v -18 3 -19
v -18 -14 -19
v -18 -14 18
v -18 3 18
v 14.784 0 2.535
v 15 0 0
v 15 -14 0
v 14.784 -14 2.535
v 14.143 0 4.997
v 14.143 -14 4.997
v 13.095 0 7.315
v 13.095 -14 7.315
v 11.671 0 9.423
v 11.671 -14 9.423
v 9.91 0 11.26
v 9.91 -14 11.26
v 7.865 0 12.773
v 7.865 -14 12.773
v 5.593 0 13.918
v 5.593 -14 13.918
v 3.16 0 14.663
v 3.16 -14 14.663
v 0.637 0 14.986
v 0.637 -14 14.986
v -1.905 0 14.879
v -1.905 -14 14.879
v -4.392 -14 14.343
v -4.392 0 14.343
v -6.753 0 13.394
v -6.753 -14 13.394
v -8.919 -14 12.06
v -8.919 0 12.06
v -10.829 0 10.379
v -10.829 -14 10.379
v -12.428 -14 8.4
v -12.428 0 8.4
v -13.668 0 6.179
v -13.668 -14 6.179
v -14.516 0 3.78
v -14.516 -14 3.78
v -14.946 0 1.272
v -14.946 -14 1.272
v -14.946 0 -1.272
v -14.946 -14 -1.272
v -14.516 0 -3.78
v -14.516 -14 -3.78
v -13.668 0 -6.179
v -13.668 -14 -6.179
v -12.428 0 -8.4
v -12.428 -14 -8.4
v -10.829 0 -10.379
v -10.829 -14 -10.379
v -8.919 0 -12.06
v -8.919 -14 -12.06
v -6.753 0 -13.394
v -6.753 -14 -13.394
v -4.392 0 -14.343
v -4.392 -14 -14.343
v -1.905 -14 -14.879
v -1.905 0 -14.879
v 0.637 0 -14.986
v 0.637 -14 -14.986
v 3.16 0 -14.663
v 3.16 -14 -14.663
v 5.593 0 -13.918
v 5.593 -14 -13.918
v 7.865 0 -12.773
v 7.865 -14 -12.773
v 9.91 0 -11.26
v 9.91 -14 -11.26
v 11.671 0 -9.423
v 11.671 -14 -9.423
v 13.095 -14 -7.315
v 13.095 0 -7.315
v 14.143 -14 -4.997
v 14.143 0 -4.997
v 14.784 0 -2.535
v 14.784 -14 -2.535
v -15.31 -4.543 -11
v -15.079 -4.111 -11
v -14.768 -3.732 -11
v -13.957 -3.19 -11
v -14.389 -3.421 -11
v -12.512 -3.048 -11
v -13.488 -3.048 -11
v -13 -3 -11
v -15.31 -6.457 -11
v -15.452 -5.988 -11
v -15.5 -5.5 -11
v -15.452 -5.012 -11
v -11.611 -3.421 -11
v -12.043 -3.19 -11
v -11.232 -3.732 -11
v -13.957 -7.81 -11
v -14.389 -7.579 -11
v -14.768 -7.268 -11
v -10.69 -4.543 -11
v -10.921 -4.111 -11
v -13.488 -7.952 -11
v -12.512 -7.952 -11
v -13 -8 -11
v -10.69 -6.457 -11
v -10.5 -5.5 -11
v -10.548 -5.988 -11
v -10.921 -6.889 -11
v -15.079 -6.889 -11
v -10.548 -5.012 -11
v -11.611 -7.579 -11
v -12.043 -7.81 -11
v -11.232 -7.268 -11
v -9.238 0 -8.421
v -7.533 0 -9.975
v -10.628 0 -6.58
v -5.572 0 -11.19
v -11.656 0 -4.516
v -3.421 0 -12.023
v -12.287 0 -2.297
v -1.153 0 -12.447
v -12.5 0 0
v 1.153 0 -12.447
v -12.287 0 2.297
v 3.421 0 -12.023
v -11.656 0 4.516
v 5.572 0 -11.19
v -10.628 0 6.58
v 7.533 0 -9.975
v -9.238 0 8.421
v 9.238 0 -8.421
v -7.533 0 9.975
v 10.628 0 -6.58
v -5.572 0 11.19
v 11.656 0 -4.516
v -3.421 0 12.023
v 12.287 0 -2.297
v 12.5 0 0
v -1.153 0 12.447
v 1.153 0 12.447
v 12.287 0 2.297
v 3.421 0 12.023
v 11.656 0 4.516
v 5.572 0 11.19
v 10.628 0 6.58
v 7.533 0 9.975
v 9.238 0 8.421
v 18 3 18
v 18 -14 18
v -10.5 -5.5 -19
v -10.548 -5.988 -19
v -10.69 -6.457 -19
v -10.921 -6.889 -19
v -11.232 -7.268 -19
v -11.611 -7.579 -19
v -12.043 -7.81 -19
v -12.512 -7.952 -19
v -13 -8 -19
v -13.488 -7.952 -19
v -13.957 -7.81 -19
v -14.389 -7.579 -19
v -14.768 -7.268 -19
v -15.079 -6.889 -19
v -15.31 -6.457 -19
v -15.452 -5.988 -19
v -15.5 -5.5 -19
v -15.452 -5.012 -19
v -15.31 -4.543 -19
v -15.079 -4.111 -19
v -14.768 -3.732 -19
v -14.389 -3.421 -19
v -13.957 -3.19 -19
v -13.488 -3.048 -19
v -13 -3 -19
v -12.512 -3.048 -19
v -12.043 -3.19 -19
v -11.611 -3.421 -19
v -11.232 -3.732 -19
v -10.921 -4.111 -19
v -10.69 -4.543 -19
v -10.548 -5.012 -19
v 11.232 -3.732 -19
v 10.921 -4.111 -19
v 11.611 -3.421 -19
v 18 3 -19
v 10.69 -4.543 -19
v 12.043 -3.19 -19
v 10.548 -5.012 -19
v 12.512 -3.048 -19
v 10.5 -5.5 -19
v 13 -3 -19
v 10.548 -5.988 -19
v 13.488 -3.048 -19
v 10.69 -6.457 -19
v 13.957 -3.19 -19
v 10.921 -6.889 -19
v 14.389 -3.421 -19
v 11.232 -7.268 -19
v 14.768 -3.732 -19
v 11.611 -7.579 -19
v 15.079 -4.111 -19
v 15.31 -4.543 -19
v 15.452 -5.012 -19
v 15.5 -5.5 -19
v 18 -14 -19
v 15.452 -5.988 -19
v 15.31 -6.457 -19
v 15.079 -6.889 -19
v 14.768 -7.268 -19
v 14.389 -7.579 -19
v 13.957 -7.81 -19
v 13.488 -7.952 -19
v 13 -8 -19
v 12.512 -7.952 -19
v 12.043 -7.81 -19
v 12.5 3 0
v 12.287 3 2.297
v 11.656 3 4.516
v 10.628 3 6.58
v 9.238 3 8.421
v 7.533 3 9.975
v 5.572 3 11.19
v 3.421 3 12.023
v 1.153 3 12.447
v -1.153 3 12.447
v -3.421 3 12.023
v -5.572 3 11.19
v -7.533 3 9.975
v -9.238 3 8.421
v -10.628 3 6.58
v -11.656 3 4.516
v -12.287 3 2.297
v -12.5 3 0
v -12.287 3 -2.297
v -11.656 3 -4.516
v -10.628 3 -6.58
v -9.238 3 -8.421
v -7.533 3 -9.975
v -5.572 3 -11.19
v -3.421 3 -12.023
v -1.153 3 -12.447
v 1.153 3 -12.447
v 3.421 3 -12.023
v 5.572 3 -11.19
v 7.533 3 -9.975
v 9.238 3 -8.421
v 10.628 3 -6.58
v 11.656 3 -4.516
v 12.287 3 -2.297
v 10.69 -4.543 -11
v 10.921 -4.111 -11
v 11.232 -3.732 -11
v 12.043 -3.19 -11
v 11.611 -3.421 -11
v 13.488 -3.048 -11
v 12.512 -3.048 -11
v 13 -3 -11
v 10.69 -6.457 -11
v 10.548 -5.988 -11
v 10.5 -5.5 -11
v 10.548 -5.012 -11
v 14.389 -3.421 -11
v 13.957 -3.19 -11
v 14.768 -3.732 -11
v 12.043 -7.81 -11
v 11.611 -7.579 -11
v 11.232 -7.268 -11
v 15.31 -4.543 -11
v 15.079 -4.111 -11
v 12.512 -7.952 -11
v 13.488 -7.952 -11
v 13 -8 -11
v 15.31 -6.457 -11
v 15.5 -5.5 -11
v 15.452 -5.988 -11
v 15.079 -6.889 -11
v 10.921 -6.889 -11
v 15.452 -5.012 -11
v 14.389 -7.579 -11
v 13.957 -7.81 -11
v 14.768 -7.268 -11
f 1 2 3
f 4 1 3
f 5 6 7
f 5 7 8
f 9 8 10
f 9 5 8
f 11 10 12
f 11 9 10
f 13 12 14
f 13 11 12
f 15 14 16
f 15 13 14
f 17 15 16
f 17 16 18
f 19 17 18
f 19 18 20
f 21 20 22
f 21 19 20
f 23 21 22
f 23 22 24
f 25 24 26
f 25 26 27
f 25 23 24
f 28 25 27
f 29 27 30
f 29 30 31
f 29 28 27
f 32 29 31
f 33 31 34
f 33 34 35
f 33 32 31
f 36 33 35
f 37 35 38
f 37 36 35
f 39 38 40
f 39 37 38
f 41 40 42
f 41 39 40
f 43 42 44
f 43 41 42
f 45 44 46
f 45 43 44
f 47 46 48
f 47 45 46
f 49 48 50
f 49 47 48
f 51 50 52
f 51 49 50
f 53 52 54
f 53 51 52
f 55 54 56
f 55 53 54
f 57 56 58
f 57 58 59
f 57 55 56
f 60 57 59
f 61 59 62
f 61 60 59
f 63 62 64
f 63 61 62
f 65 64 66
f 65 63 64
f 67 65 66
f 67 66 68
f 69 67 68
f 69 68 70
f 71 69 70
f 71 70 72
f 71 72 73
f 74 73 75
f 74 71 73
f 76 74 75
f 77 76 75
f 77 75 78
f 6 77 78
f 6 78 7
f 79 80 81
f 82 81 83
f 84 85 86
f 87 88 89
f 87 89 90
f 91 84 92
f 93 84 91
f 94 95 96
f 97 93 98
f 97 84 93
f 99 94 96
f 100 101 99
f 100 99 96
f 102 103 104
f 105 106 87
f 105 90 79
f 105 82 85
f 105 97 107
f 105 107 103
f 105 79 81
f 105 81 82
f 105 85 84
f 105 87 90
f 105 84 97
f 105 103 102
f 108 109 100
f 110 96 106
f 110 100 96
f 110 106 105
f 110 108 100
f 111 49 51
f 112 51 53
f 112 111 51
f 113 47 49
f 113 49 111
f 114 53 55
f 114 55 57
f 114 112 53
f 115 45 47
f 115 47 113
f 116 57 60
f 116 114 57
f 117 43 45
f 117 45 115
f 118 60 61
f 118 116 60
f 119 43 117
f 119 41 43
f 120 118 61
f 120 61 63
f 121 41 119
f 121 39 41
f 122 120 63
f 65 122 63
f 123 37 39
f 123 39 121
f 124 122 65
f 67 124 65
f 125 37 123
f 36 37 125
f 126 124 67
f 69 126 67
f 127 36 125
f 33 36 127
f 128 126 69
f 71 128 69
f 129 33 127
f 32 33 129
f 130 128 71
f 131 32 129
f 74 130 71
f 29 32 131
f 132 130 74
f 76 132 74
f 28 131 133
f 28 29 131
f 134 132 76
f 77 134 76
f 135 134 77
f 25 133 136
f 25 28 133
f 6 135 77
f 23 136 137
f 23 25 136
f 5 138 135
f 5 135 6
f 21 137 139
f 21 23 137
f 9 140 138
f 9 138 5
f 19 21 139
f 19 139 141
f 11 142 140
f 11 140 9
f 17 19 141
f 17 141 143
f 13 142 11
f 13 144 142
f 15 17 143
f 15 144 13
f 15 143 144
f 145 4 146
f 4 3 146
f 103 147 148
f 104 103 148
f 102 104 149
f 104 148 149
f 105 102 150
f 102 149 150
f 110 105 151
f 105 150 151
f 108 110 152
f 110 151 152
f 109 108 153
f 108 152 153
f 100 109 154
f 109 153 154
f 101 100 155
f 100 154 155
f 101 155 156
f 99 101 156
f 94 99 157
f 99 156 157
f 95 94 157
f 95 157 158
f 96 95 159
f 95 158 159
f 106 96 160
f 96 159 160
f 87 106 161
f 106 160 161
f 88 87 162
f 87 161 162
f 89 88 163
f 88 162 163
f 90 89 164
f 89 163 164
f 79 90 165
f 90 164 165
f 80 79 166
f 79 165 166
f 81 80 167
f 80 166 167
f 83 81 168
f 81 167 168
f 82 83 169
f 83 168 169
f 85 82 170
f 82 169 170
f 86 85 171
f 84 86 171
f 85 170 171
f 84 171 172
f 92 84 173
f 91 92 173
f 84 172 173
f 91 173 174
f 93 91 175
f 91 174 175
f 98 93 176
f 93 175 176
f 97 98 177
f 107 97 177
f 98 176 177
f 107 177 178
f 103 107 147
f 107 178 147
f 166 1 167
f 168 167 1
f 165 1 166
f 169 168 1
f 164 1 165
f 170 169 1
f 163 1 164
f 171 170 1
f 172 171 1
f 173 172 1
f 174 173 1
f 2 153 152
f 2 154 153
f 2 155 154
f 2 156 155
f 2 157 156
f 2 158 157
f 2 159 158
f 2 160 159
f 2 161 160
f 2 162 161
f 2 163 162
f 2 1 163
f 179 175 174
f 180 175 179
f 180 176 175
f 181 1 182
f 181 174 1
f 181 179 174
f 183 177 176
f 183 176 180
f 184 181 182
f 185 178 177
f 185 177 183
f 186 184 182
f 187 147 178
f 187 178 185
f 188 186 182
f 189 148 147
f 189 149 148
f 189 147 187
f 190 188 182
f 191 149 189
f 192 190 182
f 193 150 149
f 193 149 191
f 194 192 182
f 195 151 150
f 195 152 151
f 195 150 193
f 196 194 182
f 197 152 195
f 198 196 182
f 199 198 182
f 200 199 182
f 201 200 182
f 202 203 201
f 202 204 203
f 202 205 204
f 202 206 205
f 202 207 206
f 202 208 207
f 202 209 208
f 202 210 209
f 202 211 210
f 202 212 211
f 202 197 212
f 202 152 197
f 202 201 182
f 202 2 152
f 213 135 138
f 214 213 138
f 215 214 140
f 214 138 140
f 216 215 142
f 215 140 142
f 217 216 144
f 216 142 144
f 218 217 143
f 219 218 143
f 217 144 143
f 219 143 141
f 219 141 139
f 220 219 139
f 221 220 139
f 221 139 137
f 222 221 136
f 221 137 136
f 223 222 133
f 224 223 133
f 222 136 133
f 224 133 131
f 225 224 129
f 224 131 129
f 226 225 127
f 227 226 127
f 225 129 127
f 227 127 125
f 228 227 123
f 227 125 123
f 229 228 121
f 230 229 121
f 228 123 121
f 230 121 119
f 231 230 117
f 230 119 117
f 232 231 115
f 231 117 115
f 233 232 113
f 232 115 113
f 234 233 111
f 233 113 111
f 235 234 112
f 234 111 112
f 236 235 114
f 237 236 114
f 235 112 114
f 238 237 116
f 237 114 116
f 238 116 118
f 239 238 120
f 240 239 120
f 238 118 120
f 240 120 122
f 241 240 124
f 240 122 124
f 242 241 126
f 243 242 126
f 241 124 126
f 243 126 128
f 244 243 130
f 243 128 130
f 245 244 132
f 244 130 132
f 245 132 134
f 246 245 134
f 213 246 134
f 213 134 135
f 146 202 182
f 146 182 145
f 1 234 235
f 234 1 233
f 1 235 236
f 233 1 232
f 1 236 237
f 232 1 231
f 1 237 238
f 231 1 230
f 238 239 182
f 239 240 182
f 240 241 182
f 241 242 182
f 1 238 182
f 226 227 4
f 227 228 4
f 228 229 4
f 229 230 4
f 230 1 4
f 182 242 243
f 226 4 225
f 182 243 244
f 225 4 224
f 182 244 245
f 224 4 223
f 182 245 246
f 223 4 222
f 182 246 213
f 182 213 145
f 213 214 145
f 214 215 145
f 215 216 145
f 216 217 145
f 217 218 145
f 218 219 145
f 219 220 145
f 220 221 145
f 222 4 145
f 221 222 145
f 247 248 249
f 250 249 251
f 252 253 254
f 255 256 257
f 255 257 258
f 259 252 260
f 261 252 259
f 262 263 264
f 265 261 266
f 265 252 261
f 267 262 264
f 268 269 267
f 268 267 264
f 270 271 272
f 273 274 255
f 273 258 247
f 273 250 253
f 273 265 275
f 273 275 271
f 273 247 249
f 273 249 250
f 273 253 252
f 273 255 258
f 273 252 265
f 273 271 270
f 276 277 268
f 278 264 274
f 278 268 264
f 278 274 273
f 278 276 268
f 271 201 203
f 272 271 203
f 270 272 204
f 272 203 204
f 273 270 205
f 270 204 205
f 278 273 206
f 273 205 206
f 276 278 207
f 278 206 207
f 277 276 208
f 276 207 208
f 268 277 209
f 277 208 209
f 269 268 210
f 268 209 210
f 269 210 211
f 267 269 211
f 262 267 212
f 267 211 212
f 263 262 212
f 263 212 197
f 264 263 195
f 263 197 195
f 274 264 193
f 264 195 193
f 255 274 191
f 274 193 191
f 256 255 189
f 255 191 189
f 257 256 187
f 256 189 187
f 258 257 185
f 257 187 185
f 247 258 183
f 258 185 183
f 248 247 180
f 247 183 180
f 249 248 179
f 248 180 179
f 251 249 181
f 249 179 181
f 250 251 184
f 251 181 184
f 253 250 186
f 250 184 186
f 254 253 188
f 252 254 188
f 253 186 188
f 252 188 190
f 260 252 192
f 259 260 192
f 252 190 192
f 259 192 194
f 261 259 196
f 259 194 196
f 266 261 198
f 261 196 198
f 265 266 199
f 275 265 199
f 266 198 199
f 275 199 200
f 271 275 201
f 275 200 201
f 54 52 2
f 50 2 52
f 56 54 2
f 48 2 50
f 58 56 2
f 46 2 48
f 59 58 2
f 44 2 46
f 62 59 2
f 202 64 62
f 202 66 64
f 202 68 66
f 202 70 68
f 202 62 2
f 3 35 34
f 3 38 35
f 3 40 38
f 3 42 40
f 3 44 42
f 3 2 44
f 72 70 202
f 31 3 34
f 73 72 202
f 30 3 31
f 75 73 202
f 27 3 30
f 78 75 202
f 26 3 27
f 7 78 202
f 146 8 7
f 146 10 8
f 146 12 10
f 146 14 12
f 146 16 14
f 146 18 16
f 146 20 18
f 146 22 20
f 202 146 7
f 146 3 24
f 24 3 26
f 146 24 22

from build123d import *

# Parameters (mm, degrees)
F0_W     = 36
F0_H     = 37
F0_R     = 15
F1_DEPTH = 14
F0_R_2   = 12.5
F2_DEPTH = 3
F3_R     = 2.5
F4_DEPTH = 8


with BuildPart() as f1:
    # F0 (on Front) → F1 (new body)
    with BuildSketch(Plane.XZ):
        with Locations((0, -0.5)):
            Rectangle(F0_W, F0_H)
        Circle(F0_R, mode=Mode.SUBTRACT)
    extrude(amount=F1_DEPTH)

    # F0 (on Front) → F2 (join)
    with BuildSketch(Plane.XZ):
        with Locations((0, -0.5)):
            Rectangle(F0_W, F0_H)
        Circle(F0_R, mode=Mode.SUBTRACT)
        Circle(F0_R)
        Circle(F0_R_2, mode=Mode.SUBTRACT)
    extrude(amount=-F2_DEPTH)

    # F3 (on face) → F4 (cut)
    with BuildSketch(Plane(origin=(0, 0, -19), x_dir=(1, 0, 0), z_dir=(0, 0, -1))):
        with Locations((-13, 5.5)):
            Circle(F3_R)
        with Locations((13, 5.5)):
            Circle(F3_R)
    extrude(amount=-F4_DEPTH, mode=Mode.SUBTRACT)


solid = f1.part
